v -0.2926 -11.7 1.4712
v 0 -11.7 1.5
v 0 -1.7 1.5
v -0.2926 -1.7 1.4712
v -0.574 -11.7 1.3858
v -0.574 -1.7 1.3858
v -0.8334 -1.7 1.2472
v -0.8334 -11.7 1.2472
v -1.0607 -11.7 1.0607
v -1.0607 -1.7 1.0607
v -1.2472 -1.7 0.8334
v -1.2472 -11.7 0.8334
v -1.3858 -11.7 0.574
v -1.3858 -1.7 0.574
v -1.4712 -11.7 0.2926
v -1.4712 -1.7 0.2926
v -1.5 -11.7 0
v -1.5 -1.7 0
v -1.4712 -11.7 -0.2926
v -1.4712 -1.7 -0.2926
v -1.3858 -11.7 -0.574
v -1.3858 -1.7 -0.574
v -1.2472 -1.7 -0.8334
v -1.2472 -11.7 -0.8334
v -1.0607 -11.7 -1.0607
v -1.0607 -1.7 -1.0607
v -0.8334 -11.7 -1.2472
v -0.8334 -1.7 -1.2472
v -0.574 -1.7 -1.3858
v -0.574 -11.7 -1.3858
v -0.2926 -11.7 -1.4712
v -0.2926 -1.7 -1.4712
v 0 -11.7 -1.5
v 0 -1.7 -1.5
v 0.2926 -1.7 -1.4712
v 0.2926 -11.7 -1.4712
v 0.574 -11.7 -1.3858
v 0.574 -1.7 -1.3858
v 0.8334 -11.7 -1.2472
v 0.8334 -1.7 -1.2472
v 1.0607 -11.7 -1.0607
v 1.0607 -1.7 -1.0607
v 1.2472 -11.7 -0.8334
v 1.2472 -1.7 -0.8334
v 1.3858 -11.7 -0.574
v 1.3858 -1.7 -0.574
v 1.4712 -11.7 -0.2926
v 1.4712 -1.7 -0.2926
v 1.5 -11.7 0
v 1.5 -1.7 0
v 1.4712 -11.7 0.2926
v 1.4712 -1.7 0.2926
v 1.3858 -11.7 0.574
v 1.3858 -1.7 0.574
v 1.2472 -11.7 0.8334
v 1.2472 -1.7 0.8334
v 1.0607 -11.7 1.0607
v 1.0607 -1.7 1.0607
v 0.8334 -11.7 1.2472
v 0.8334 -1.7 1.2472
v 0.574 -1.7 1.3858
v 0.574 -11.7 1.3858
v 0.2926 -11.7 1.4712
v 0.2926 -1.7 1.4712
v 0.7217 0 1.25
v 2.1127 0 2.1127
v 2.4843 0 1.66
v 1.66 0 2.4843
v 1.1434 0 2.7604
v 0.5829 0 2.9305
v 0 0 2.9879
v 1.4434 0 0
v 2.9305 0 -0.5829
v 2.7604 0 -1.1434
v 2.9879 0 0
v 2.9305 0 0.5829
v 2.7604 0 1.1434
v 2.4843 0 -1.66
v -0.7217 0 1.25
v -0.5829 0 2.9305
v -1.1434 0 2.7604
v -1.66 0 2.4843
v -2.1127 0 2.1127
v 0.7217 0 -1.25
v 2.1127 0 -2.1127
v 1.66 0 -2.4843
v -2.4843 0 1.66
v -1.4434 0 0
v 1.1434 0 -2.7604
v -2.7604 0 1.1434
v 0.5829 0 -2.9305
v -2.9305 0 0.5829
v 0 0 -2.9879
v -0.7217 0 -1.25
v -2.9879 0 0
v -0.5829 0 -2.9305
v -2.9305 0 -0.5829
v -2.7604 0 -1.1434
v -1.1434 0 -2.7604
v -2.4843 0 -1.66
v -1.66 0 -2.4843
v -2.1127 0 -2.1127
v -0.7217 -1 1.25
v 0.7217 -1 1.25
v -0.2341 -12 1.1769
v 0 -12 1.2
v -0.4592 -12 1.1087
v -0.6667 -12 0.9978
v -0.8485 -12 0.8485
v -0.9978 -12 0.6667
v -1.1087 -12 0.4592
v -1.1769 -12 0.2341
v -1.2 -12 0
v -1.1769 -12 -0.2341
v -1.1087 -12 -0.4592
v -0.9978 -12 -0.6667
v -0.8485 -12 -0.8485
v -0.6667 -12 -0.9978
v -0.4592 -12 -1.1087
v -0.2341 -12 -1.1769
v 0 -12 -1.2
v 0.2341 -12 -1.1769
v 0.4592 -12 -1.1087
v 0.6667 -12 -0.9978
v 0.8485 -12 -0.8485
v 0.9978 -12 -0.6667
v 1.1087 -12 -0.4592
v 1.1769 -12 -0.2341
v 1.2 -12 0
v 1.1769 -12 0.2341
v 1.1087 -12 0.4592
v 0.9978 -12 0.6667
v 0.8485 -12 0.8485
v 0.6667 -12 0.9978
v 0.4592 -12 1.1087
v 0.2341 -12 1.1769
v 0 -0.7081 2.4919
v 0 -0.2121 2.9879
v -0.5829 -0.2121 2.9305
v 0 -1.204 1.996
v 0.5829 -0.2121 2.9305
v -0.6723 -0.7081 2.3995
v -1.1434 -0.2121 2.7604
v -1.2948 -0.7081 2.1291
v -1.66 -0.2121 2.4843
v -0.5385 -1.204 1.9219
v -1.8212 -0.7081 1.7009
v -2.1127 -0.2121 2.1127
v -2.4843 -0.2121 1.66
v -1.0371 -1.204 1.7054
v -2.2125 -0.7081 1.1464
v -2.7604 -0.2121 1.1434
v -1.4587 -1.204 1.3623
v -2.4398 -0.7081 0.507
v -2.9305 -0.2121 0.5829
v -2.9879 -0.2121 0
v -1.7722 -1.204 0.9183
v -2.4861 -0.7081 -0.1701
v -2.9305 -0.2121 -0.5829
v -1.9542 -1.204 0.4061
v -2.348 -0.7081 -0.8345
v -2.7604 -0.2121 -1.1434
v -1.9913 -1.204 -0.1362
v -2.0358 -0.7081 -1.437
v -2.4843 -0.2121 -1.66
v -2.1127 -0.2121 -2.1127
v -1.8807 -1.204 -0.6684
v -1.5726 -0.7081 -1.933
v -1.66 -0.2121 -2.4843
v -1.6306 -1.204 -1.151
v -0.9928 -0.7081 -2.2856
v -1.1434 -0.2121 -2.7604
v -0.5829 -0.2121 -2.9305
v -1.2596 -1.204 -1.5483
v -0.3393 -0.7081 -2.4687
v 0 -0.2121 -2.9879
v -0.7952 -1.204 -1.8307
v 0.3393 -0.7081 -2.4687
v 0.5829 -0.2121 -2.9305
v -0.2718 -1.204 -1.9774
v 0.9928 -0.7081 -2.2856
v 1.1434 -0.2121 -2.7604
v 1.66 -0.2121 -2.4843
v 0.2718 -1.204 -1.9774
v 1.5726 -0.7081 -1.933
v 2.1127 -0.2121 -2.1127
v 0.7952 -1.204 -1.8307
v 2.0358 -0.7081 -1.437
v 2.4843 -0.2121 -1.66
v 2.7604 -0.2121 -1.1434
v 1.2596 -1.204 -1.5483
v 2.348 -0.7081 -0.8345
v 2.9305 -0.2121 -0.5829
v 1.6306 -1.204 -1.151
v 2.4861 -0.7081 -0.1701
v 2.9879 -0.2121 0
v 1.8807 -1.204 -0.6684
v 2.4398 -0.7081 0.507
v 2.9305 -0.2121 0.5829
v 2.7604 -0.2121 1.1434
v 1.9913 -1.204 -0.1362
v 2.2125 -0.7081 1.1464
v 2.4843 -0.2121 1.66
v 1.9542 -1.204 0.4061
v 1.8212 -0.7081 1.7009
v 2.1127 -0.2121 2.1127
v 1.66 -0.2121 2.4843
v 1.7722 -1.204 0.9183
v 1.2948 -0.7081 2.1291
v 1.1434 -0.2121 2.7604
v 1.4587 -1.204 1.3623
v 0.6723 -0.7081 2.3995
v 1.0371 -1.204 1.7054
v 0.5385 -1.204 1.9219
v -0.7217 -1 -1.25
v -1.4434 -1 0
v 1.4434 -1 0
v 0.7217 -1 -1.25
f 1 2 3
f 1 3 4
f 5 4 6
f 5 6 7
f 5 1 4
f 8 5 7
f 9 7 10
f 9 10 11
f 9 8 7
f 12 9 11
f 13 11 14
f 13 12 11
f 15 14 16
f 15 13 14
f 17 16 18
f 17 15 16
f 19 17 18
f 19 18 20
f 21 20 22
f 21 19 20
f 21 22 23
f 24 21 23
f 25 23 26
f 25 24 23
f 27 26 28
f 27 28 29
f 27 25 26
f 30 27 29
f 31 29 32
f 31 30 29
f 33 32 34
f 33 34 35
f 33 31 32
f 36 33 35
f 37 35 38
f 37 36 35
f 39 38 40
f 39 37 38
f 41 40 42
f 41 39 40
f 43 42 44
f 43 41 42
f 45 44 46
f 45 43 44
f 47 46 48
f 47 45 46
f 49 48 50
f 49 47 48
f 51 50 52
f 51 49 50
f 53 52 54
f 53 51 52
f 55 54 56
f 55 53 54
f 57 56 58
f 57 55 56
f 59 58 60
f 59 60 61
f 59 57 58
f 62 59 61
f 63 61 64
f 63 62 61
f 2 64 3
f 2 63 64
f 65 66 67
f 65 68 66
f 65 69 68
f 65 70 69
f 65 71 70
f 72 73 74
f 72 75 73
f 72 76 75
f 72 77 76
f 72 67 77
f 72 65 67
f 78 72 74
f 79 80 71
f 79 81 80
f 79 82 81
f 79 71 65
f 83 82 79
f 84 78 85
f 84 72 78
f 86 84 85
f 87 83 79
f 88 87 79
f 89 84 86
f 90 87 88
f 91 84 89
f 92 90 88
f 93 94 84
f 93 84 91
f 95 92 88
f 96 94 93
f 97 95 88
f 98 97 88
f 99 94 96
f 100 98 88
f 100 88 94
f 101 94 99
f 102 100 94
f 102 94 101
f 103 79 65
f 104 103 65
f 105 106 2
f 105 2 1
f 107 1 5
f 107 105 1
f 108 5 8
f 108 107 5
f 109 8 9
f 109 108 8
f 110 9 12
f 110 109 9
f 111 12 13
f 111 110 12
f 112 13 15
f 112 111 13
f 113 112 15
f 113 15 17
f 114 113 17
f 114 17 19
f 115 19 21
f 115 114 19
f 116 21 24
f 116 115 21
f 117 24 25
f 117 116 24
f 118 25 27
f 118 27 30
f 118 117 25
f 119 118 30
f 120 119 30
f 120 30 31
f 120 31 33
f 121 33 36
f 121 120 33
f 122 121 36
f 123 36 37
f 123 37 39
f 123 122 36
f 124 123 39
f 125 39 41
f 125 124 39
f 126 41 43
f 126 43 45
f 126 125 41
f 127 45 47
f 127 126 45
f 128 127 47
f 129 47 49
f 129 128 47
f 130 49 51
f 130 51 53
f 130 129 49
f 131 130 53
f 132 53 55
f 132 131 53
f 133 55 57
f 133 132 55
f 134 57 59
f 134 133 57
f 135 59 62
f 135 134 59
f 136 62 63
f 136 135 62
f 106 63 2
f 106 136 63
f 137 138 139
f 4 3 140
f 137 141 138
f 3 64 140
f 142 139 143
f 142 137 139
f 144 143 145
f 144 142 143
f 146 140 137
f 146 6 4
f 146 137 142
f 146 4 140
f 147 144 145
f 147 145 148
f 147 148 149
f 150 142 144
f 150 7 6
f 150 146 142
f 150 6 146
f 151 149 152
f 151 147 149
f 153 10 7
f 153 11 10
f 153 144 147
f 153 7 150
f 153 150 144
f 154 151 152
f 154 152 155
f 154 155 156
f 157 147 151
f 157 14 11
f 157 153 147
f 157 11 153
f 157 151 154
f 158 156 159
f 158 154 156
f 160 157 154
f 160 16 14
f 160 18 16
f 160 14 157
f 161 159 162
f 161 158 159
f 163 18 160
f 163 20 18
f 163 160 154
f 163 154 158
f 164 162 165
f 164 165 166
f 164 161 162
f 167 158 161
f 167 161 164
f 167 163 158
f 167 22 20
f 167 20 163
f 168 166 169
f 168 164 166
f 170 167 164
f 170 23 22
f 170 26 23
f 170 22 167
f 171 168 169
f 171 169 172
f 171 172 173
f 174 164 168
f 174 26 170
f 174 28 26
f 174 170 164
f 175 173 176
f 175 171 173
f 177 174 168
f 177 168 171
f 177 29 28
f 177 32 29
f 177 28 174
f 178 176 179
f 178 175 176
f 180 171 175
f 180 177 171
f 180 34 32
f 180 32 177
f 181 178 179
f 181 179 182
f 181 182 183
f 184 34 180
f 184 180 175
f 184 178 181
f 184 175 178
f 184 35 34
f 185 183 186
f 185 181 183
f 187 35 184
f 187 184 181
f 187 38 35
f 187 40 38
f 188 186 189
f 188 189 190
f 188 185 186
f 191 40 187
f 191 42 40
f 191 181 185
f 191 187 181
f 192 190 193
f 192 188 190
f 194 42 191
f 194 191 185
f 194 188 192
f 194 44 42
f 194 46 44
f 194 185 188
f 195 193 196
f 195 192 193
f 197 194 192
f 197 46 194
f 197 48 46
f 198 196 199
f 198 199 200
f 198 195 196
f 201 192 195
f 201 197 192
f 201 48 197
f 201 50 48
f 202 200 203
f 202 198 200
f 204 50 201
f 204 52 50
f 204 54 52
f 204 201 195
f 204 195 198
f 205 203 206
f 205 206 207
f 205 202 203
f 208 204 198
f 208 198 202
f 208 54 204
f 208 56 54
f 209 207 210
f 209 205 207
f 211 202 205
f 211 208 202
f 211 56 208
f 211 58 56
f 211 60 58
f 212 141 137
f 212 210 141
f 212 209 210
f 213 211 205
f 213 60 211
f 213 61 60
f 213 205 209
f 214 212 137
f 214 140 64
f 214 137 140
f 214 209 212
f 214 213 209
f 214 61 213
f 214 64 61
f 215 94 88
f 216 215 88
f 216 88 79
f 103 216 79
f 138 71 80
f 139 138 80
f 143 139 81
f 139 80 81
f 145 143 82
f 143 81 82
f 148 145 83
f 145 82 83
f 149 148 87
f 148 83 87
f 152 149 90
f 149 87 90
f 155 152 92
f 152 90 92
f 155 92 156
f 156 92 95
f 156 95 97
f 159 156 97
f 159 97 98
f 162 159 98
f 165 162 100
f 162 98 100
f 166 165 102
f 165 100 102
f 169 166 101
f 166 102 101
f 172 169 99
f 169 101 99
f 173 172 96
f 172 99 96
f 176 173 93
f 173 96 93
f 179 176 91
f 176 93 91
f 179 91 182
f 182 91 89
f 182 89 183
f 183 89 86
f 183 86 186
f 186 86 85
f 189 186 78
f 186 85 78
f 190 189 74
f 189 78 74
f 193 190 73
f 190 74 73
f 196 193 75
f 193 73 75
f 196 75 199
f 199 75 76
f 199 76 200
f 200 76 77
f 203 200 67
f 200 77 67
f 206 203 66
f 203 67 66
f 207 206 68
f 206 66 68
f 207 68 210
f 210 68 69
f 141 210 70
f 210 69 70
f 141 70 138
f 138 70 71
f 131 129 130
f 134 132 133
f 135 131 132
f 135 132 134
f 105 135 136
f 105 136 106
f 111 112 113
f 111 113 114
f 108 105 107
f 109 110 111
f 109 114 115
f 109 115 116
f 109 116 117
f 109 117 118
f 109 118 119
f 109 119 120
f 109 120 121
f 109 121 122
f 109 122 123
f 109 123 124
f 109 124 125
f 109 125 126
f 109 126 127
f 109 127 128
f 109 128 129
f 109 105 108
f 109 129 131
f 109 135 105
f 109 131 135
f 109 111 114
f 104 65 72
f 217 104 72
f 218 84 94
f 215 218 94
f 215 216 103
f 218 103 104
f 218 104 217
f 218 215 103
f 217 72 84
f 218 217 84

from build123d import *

# Parameters (mm, degrees)
CHAFL_N2_SIZE         = 0.3
CHAFL_N2_SIZE2        = 0.212132034
CHAFL_N3_SIZE         = 0.3
CORTAR_EXTRUIR2_DEPTH = 1


with BuildPart() as part:
    # Croquis1 → Revolución1 (revolve)
    with BuildSketch(Plane.XY, mode=Mode.PRIVATE) as revoluci_n1_sk:
        Polygon((0, 0), (3.2, 0), (1.5, -1.7), (1.5, -12), (0, -12), align=None)
    revolve(revoluci_n1_sk.sketch.rotate(Axis((0, 0, 0), (0, -1, 0)), 90), axis=Axis((0, 0, 0), (0, -1, 0)))

    # Chaflán2
    chafl_n2_edges = [part.edges().sort_by_distance(p)[0] for p in [
        (0, 0, -3.2),
    ]]
    chafl_n2_side = [part.faces().sort_by_distance(p)[0] for p in [
        (0, -0.85, -2.35),
    ]]
    chamfer(chafl_n2_edges, length=CHAFL_N2_SIZE, length2=CHAFL_N2_SIZE2, reference=chafl_n2_side[0])

    # Chaflán3
    chafl_n3_edges = [part.edges().sort_by_distance(p)[0] for p in [
        (0, -12, -1.5),
    ]]
    chamfer(chafl_n3_edges, length=CHAFL_N3_SIZE)

    # Croquis3 → Cortar-Extruir2 (cut)
    with BuildSketch(Plane(origin=(0, 0, 0), x_dir=(1, 0, 0), z_dir=(0, 1, 0))):
        Polygon((-0.721687836, 1.25), (-1.443375673, 0), (-0.721687836, -1.25), (0.721687836, -1.25), (1.443375673, 0), (0.721687836, 1.25), align=None)
    extrude(amount=-CORTAR_EXTRUIR2_DEPTH, mode=Mode.SUBTRACT)


solid = part.part
